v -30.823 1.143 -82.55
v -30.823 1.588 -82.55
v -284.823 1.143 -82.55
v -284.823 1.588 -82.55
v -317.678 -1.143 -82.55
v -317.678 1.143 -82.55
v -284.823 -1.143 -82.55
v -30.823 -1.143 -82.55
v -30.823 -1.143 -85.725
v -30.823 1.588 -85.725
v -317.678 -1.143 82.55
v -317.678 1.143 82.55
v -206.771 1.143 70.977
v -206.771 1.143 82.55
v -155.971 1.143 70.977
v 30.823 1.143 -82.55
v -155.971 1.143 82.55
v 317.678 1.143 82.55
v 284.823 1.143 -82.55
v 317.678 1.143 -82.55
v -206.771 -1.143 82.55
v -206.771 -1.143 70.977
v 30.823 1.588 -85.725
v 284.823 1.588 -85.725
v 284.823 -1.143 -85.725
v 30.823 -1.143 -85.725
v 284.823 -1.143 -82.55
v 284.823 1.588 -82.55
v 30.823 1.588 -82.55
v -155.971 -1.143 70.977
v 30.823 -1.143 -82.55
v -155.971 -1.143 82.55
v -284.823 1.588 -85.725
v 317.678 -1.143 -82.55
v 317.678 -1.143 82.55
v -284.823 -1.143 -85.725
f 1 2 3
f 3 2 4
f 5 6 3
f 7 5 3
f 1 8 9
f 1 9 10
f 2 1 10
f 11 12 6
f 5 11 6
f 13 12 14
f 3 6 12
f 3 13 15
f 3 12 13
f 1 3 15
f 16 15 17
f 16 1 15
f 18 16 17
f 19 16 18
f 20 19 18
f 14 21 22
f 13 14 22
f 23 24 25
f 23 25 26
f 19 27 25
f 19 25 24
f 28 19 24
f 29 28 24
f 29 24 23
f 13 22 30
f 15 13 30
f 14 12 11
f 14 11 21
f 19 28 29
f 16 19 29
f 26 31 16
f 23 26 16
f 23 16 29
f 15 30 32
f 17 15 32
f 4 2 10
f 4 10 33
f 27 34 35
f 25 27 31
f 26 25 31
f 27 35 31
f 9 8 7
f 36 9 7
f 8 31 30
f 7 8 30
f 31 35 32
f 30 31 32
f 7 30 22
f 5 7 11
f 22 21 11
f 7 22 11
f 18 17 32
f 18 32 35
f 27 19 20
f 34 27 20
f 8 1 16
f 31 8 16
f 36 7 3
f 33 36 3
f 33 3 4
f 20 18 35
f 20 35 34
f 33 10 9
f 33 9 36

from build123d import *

# Parameters (mm, degrees)
SKETCH1_W           = 635.3556
SKETCH1_H           = 165.1
BOSS_EXTRUDE1_DEPTH = 1.143
SKETCH2_W           = 254
SKETCH2_H           = 2.7305
BOSS_EXTRUDE2_DEPTH = 3.175
SKETCH3_W           = 50.8
SKETCH3_H           = 11.194977228
SKETCH3_H_2         = 11.572519195
CUT_EXTRUDE1_DEPTH  = 330.052299594


with BuildPart() as part:
    # Sketch1 → Boss-Extrude1 (new, symmetric)
    with BuildSketch(Plane(origin=(0, 0, 0), x_dir=(1, 0, 0), z_dir=(0, 1, 0))):
        Rectangle(SKETCH1_W, SKETCH1_H)
    extrude(amount=BOSS_EXTRUDE1_DEPTH, both=True)

    # Sketch2 → Boss-Extrude2 (add)
    with BuildSketch(Plane(origin=(0, 0, -82.55), x_dir=(-1, 0, 0), z_dir=(0, 0, -1))):
        with Locations((-157.8229, 0.22225)):
            Rectangle(SKETCH2_W, SKETCH2_H)
        with Locations((157.8229, 0.22225)):
            Rectangle(SKETCH2_W, SKETCH2_H)
    extrude(amount=BOSS_EXTRUDE2_DEPTH)

    # Sketch3 → Cut-Extrude1 (cut, through all)
    with BuildSketch(Plane.XZ.offset(1.143)):
        with Locations((-181.370930865, 88.147488614)):
            Rectangle(SKETCH3_W, SKETCH3_H)
        with Locations((-181.370930865, 76.763740403)):
            Rectangle(SKETCH3_W, SKETCH3_H_2)
    extrude(amount=-CUT_EXTRUDE1_DEPTH, mode=Mode.SUBTRACT)


solid = part.part
